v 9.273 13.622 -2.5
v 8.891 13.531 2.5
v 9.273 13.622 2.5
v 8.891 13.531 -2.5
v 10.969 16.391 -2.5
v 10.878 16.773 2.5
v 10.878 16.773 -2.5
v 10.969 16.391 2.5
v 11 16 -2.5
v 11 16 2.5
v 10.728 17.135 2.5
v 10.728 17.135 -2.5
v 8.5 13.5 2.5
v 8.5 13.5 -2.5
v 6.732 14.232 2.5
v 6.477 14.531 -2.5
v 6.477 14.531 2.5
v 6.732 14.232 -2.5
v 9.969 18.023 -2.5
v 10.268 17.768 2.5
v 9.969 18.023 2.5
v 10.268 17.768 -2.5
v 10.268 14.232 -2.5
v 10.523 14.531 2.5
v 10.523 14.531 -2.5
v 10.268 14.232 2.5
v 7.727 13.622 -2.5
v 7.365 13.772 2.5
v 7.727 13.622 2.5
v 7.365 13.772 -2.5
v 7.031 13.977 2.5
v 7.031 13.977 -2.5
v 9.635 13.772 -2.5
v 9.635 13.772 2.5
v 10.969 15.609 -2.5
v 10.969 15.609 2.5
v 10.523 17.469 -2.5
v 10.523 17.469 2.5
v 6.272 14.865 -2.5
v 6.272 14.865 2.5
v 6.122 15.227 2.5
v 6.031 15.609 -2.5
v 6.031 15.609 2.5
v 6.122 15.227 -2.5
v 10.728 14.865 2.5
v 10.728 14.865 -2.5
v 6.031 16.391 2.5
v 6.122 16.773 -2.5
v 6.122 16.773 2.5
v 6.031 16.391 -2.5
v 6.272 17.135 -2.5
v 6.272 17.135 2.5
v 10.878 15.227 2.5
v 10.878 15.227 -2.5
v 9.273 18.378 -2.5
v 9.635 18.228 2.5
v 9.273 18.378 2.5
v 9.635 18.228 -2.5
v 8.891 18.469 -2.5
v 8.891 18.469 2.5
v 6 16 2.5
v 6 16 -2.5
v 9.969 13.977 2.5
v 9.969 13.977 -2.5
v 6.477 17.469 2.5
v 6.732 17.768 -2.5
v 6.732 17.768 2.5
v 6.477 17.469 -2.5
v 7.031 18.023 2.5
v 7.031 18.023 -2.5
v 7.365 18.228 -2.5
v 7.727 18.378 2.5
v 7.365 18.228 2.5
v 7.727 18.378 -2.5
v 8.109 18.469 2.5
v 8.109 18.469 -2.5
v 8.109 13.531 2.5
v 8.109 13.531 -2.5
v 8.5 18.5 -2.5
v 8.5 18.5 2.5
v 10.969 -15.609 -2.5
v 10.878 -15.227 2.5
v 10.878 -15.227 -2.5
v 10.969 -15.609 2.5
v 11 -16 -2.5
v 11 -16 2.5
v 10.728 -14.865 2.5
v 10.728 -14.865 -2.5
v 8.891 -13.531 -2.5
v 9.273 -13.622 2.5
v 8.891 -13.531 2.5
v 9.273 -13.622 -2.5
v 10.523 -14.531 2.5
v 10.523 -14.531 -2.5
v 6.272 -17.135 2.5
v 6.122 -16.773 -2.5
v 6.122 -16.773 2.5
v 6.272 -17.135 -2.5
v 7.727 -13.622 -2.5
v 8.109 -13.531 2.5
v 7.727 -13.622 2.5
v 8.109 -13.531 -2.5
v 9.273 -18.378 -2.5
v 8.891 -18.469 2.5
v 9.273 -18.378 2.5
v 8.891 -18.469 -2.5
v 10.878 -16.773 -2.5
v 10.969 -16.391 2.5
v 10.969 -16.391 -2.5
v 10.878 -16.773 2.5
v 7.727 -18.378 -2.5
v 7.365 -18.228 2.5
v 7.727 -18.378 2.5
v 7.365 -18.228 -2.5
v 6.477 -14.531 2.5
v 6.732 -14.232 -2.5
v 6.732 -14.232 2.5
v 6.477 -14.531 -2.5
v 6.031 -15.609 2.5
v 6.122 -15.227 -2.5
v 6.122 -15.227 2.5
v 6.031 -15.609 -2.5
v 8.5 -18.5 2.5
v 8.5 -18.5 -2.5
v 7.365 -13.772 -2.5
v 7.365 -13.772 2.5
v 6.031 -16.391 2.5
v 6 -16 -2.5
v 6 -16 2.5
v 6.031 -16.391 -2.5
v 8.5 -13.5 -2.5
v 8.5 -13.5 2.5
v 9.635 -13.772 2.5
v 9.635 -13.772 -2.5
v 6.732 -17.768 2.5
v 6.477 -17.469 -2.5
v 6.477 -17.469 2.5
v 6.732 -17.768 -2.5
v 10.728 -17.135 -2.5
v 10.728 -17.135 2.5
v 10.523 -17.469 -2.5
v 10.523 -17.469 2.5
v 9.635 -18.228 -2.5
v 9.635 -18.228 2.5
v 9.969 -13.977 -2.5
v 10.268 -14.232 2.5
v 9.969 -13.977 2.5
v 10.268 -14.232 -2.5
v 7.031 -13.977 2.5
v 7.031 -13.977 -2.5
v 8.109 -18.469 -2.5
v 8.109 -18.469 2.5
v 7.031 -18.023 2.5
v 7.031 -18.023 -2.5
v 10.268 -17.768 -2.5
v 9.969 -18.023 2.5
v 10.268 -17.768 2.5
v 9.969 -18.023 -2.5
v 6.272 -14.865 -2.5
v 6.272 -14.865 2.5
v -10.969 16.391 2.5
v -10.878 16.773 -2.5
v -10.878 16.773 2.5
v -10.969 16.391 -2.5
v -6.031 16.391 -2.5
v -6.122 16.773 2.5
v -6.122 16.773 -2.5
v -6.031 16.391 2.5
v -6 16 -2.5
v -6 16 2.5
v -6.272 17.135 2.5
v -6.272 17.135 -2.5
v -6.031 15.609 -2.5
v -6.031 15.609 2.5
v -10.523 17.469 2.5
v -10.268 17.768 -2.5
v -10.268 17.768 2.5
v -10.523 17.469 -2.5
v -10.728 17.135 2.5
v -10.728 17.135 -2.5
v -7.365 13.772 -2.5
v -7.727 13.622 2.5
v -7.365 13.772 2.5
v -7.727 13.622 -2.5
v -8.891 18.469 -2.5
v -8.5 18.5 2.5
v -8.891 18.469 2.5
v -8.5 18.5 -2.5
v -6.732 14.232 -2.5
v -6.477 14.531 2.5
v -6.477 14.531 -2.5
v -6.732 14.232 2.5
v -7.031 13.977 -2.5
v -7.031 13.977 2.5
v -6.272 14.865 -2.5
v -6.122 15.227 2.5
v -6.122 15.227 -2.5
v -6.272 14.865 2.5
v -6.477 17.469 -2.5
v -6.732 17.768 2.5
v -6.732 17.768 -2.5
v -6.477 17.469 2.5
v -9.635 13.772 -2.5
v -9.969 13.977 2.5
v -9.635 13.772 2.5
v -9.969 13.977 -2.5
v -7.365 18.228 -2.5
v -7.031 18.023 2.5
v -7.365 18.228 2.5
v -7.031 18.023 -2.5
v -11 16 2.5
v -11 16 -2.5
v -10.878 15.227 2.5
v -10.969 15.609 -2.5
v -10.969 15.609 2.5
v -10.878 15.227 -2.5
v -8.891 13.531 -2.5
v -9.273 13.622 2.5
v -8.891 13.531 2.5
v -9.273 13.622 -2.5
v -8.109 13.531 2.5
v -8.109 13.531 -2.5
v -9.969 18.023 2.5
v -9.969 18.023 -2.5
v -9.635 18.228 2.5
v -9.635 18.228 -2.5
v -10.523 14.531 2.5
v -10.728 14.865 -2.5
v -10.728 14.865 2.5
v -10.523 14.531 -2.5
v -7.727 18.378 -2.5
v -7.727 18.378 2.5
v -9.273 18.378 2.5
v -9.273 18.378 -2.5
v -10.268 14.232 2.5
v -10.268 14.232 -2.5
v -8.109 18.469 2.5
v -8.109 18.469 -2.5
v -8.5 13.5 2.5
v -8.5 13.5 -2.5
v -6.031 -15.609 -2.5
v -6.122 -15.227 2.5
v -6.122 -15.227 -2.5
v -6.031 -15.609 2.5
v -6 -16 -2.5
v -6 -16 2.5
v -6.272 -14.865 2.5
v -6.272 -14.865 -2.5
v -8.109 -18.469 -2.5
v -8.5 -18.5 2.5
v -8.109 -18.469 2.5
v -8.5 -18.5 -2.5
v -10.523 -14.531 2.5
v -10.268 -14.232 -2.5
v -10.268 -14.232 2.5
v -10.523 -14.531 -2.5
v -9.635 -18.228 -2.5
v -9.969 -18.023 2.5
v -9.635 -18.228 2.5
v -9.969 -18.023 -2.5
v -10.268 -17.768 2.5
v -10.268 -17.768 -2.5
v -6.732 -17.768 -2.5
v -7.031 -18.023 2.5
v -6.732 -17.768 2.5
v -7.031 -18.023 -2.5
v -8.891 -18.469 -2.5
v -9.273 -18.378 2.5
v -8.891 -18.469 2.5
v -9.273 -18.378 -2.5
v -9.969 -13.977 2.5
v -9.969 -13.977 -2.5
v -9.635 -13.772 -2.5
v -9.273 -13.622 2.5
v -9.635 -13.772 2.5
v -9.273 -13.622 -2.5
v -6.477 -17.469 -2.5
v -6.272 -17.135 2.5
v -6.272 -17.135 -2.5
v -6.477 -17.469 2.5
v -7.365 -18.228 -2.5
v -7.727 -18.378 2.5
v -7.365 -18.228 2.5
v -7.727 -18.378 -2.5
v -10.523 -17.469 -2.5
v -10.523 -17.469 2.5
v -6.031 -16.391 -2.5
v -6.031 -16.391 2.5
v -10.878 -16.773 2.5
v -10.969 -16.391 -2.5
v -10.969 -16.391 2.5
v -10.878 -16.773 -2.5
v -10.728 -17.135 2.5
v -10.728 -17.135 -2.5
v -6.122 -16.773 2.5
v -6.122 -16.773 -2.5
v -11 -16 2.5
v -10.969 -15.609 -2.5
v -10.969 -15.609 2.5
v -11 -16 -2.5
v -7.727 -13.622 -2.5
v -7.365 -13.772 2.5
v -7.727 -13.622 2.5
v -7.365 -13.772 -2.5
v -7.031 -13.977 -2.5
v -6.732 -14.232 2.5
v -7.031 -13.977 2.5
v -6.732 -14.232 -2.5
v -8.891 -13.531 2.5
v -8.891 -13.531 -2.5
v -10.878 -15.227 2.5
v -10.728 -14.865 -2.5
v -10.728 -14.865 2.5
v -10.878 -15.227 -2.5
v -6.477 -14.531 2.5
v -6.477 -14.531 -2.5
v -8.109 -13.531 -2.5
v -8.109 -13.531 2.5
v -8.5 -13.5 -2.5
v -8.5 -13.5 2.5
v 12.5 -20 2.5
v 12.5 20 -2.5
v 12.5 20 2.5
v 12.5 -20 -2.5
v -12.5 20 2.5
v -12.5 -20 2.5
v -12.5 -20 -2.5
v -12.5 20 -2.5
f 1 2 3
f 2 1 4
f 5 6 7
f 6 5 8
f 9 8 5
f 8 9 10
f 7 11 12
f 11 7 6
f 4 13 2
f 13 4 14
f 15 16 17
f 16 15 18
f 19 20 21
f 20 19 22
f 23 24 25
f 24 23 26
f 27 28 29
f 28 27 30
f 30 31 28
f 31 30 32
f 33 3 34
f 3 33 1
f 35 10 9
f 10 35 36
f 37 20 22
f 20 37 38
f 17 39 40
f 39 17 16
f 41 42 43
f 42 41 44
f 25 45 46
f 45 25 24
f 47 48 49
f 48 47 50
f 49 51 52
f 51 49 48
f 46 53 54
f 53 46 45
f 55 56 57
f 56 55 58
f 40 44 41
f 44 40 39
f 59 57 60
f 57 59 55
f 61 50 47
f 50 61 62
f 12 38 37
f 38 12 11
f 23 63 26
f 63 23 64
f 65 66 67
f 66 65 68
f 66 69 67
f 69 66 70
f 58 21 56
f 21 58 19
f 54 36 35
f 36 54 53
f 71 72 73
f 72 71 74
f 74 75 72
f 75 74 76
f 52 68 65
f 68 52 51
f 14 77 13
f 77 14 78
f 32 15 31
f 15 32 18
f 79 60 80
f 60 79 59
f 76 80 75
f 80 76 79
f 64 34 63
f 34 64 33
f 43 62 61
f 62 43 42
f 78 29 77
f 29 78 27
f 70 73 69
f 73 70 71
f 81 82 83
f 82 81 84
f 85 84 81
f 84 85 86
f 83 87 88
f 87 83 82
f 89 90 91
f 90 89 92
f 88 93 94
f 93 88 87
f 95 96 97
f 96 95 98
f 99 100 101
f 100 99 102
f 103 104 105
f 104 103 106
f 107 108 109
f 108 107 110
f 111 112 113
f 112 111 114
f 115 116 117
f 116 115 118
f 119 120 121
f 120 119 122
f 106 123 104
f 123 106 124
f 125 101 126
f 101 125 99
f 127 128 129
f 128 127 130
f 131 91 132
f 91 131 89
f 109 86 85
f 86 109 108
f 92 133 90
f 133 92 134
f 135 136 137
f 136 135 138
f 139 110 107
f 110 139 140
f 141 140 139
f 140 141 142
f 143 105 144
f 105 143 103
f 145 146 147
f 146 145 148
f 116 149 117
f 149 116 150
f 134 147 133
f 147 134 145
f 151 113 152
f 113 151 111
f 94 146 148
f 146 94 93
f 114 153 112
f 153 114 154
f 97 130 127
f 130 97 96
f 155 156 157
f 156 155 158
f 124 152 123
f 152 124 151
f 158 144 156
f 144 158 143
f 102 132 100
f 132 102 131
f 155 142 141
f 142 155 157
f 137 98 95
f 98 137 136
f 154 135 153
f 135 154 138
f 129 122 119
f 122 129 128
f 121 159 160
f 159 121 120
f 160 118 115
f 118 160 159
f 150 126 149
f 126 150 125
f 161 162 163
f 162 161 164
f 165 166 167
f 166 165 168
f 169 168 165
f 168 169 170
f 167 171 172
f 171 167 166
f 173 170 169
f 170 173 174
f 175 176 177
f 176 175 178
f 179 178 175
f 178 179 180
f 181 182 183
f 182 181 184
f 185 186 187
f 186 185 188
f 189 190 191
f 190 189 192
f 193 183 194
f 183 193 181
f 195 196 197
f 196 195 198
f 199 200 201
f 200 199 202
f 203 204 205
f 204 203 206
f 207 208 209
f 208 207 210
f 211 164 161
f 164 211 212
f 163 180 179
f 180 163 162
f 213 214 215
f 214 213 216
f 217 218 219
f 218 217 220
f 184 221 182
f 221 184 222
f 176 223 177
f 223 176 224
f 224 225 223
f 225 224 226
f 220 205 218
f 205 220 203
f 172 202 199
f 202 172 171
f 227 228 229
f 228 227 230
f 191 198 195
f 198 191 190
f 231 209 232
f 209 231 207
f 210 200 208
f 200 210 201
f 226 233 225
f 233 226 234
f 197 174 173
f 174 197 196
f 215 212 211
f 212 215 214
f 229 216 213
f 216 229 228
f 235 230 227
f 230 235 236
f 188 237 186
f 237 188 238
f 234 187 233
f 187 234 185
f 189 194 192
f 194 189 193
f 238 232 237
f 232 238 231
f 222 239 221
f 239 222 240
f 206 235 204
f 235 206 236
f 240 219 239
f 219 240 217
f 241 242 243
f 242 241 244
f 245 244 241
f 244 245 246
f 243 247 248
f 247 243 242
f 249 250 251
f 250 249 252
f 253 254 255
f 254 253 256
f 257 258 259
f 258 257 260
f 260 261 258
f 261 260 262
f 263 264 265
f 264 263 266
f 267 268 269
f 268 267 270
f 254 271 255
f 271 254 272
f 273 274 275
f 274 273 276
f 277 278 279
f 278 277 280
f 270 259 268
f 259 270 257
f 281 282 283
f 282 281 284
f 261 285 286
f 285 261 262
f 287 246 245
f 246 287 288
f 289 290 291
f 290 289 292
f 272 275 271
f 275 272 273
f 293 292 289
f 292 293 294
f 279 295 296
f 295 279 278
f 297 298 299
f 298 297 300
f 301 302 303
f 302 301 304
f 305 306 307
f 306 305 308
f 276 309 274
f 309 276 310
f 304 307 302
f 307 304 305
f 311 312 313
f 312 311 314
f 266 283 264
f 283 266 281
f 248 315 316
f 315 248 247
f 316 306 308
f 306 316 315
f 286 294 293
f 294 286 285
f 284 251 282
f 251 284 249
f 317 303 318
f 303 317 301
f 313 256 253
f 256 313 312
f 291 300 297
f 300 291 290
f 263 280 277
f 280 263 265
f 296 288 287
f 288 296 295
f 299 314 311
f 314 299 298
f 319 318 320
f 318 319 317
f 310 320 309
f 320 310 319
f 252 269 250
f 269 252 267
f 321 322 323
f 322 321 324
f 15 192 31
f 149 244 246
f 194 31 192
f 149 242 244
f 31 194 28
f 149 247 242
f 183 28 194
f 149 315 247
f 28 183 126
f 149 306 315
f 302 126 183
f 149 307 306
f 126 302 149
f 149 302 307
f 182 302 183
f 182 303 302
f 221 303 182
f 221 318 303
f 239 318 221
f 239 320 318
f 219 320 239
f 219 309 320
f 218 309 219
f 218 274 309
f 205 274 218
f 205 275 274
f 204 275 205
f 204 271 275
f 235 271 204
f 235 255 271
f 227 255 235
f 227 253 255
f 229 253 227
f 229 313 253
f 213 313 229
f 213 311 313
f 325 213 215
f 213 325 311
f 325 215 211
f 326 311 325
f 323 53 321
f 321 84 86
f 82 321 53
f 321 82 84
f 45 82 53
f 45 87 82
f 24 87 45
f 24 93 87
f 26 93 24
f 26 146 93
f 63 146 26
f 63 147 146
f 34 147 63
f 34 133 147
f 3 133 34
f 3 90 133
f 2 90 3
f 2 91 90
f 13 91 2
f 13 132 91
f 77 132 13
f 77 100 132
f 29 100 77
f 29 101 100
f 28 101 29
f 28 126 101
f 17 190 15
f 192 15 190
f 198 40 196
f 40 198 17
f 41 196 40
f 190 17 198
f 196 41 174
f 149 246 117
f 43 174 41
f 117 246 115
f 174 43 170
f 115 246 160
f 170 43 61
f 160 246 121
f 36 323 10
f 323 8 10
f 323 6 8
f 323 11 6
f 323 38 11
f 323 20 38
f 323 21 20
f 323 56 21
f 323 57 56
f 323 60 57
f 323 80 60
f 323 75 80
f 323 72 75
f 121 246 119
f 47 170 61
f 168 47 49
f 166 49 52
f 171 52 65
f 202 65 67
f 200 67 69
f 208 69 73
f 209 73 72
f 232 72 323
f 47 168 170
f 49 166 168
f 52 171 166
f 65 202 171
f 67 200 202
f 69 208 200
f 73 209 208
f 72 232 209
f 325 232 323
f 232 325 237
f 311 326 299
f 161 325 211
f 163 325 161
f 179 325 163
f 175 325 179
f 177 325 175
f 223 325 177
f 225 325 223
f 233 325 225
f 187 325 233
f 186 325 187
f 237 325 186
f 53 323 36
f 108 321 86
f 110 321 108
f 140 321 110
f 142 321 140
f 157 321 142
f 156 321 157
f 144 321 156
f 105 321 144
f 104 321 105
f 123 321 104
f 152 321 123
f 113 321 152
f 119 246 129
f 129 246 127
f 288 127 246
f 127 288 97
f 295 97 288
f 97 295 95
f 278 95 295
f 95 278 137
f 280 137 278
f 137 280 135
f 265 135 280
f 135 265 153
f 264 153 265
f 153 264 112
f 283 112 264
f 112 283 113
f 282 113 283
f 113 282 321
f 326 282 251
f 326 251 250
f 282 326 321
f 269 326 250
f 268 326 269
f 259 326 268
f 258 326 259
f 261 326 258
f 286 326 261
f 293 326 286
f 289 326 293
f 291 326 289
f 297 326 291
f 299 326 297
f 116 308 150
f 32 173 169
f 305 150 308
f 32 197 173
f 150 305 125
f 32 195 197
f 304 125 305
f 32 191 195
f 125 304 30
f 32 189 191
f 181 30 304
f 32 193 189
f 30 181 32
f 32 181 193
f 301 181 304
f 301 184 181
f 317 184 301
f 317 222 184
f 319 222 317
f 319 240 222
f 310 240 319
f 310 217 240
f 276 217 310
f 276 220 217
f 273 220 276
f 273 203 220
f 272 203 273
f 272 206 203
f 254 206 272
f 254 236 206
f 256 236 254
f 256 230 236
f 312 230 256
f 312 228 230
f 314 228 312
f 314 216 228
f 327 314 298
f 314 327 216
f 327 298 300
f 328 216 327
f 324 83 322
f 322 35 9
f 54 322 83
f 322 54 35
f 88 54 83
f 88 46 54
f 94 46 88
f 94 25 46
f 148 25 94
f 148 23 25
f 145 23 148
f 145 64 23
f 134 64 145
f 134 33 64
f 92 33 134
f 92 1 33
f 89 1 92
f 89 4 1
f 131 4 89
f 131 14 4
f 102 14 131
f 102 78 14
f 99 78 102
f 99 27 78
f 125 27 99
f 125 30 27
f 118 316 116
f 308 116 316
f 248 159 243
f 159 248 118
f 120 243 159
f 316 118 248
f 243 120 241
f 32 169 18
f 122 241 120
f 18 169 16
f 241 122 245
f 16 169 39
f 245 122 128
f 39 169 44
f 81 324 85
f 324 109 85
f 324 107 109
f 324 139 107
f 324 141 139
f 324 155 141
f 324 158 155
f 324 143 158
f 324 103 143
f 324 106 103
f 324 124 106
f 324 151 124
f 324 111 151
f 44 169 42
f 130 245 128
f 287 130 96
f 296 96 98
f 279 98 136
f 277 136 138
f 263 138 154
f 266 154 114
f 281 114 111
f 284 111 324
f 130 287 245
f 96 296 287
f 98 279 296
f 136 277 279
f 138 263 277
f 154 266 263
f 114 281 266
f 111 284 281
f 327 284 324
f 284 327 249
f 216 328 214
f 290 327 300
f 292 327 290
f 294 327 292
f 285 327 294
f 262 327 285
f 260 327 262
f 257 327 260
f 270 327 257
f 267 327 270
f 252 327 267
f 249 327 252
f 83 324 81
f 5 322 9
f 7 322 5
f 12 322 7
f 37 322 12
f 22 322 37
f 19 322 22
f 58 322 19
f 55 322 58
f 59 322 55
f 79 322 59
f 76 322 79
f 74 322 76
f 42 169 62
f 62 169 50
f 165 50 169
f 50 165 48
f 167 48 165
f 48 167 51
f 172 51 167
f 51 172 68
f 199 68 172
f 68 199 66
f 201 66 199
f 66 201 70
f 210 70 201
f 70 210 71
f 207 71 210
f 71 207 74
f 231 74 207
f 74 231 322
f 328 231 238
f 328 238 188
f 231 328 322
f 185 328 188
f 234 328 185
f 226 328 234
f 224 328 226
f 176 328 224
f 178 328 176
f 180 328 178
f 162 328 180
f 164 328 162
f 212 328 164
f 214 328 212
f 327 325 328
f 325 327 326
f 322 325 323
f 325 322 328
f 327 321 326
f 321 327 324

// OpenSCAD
// file: microGearMotorMount.scad
//===============================
//
//  No-tools micro motor mounts
//
//  Designed by Andrew Moore, May 2016
//      http://www.thingiverse.com/TacPar
//
//      For questions, suggestions, or whatever, 
//      please PM me through thingiverse.
//
//      This work is licensed under a Creative Commons 
//      Attribution-ShareAlike 4.0 International License.
//      http://creativecommons.org/licenses/by-sa/4.0/
//
//  This can be used with a variety of 12mm micro gear motors
//  Length dimensions may need to change to accomodate 
//  different gear ratios (particularly the Pololu 
//  1000:1 motors)
//
//  This design allows for a little slop in motor 
//  position.  You can always tighten that up with 
//  some shim stock after you insert the motor.
//
//  The mounting holes are arbitrarily set based on the plate dimensions
//  This could be improved.
//
//  If you use an encoder, you may have to solder it to the back of the 
//  motor after inserting the motor into the holder.
//===============================



//this is motor length without the gearbox
motor_length = 15;
//dimension for rounded sides on micro motor
motor_width = 12; 	
//flat sides on micro motor
motor_height = 10;
//length of the gear box not including the output shaft
gearbox_length = 10;

//wall thickness for the motor holder before tolerance losses
housing_thickness = 3;

//this defines how oversized the hole is for the motor
//this will reduce the effective housing thickness above
tolerance = 0.25;

plate_width = 40;

plate_length = motor_length+gearbox_length;

module MicroGearMotorMount(
  plate_thickness = 3
)
{
	//backplate()
	difference()
	{
		positives();
		negatives();
	}
	//add ons in areas that were erased...
	
	//back plate
	translate([plate_length/2-motor_length/2,0,-(motor_height/2+plate_thickness/2)]) BackPlate(plate_thickness);

	module positives()
	{
		//motor holding ring
		rotate([0,90,0]) 
            translate([0,0,0]) 
            cylinder(r=motor_width/2+housing_thickness, h=motor_length, center=true, $fn=40);

		translate([0,0,-motor_height/2+plate_thickness]) 
            cube([motor_length,motor_width+2*housing_thickness,motor_height-plate_thickness], center=true);

	}

	module negatives()
	{
		//cut off cylinder below the mounting plate
		translate([0,0,-(motor_height/2+plate_thickness-0.01)]) 
            cube([100,100,2*plate_thickness], center=true);

		//keyed shaft
		rotate([0,90,0]) 
        translate([0,0,-motor_length/2-0.1]) keyshaft(); 
        //translate([0,0,-motor_height/4]) cube([motor_length+.1,motor_width+1,motor_height/2], center=true);
		
	}
    module keyshaft()
    {
        difference()
		{
			positives();
            negatives();
            
			
		}
        module positives()
        {
            cylinder(r=motor_width/2+tolerance, h=motor_length+1, $fn=50);
        }
        
        module negatives()
        {
            translate([-motor_height-tolerance,0,motor_length/2+tolerance]) cube([motor_height,motor_width,motor_length+2],center=true);
            translate([motor_height+tolerance,0,motor_length/2+tolerance]) cube([motor_height,motor_width,motor_length+2],center=true);
        }
    }
  }


module BackPlate(plate_thickness=3,tab=true,screw_radius=1.75)
	{
      tongue_thickness=2;
      tab_height = tongue_thickness+2;
      tab_width = 5;
      tab_thickness = 1.5;

      difference()
      {
        positives();
        negatives();
      }
        
      module positives()
      {
          cube([plate_length,plate_width,plate_thickness],center=true);
      }
      module negatives()
      {
          mount_holes();
        if (tab) {tab_slots();}
      }
        
      module mount_holes()
      {
        rotate([0,0,0]) 
                  translate([plate_length/2-4,plate_width/2-4,0]) 
                  cylinder(r=screw_radius, h=plate_thickness+1, $fn=40, center=true);
        rotate([0,0,0])
                  translate([plate_length/2-4,-(plate_width/2-4),0]) 
                  cylinder(r=screw_radius, h=plate_thickness+1, $fn=40, center=true);
        rotate([0,0,0])
                  translate([-(plate_length/2-4),plate_width/2-4,0]) 
                  cylinder(r=screw_radius, h=plate_thickness+1, $fn=40, center=true);
        rotate([0,0,0])
                  translate([-(plate_length/2-4),-(plate_width/2-4),0]) 
                  cylinder(r=screw_radius, h=plate_thickness+1, $fn=40, center=true);
        
      }
      
      module tab_slots()
      {
        translate([0.4*plate_length,tab_width/2, 0]) cube([plate_length,1,plate_thickness+1], center=true);
        translate([0.4*plate_length,-tab_width/2, 0]) cube([plate_length,1,plate_thickness+1], center=true);
        
        // If the tongue needs to be thinner
        translate([0.4*plate_length,0, -tongue_thickness]) cube([plate_length,tab_width,plate_thickness], center=true);
      }
	

	   //gearbox tab ... stops motor from sliding forward
      if (tab)
      {
        translate([plate_length/2+tab_thickness/2,0,plate_thickness/2]) cube([tab_thickness,tab_width-1,tab_height], center=true);
        
        //Print a very thin support that will break, so tab can be printed in upright rotation
        support_thickness=0.1;
        translate([plate_length/2,(tab_width-1)/2,plate_thickness/2])rotate([0,0,180])prism(support_thickness,tab_height-tongue_thickness,tab_height-tongue_thickness);
        translate([plate_length/2,-(tab_width-1)/2+support_thickness,plate_thickness/2])rotate([0,0,180])prism(support_thickness,tab_height-tongue_thickness,tab_height-tongue_thickness);
      }
}

//Draw a prism based on a 
//right angled triangle
//l - length of prism
//w - width of triangle
//h - height of triangle
//From https://github.com/orionrobots/openscad_parts_library/blob/master/prism.scad
module prism(l, w, h) {
       polyhedron(points=[
               [0,0,h],           // 0    front top corner
               [0,0,0],[w,0,0],   // 1, 2 front left & right bottom corners
               [0,l,h],           // 3    back top corner
               [0,l,0],[w,l,0]    // 4, 5 back left & right bottom corners
       ], faces=[ // points for all faces must be ordered clockwise when looking in
               [0,2,1],    // top face
               [3,4,5],    // base face
               [0,1,4,3],  // h face
               [1,2,5,4],  // w face
               [0,3,5,2],  // hypotenuse face
       ]);
}

MicroGearMotorMount();
// main file
use <microGearMotorMount.scad>
BackPlate(plate_thickness=5, tab=false, screw_radius=2.5);
